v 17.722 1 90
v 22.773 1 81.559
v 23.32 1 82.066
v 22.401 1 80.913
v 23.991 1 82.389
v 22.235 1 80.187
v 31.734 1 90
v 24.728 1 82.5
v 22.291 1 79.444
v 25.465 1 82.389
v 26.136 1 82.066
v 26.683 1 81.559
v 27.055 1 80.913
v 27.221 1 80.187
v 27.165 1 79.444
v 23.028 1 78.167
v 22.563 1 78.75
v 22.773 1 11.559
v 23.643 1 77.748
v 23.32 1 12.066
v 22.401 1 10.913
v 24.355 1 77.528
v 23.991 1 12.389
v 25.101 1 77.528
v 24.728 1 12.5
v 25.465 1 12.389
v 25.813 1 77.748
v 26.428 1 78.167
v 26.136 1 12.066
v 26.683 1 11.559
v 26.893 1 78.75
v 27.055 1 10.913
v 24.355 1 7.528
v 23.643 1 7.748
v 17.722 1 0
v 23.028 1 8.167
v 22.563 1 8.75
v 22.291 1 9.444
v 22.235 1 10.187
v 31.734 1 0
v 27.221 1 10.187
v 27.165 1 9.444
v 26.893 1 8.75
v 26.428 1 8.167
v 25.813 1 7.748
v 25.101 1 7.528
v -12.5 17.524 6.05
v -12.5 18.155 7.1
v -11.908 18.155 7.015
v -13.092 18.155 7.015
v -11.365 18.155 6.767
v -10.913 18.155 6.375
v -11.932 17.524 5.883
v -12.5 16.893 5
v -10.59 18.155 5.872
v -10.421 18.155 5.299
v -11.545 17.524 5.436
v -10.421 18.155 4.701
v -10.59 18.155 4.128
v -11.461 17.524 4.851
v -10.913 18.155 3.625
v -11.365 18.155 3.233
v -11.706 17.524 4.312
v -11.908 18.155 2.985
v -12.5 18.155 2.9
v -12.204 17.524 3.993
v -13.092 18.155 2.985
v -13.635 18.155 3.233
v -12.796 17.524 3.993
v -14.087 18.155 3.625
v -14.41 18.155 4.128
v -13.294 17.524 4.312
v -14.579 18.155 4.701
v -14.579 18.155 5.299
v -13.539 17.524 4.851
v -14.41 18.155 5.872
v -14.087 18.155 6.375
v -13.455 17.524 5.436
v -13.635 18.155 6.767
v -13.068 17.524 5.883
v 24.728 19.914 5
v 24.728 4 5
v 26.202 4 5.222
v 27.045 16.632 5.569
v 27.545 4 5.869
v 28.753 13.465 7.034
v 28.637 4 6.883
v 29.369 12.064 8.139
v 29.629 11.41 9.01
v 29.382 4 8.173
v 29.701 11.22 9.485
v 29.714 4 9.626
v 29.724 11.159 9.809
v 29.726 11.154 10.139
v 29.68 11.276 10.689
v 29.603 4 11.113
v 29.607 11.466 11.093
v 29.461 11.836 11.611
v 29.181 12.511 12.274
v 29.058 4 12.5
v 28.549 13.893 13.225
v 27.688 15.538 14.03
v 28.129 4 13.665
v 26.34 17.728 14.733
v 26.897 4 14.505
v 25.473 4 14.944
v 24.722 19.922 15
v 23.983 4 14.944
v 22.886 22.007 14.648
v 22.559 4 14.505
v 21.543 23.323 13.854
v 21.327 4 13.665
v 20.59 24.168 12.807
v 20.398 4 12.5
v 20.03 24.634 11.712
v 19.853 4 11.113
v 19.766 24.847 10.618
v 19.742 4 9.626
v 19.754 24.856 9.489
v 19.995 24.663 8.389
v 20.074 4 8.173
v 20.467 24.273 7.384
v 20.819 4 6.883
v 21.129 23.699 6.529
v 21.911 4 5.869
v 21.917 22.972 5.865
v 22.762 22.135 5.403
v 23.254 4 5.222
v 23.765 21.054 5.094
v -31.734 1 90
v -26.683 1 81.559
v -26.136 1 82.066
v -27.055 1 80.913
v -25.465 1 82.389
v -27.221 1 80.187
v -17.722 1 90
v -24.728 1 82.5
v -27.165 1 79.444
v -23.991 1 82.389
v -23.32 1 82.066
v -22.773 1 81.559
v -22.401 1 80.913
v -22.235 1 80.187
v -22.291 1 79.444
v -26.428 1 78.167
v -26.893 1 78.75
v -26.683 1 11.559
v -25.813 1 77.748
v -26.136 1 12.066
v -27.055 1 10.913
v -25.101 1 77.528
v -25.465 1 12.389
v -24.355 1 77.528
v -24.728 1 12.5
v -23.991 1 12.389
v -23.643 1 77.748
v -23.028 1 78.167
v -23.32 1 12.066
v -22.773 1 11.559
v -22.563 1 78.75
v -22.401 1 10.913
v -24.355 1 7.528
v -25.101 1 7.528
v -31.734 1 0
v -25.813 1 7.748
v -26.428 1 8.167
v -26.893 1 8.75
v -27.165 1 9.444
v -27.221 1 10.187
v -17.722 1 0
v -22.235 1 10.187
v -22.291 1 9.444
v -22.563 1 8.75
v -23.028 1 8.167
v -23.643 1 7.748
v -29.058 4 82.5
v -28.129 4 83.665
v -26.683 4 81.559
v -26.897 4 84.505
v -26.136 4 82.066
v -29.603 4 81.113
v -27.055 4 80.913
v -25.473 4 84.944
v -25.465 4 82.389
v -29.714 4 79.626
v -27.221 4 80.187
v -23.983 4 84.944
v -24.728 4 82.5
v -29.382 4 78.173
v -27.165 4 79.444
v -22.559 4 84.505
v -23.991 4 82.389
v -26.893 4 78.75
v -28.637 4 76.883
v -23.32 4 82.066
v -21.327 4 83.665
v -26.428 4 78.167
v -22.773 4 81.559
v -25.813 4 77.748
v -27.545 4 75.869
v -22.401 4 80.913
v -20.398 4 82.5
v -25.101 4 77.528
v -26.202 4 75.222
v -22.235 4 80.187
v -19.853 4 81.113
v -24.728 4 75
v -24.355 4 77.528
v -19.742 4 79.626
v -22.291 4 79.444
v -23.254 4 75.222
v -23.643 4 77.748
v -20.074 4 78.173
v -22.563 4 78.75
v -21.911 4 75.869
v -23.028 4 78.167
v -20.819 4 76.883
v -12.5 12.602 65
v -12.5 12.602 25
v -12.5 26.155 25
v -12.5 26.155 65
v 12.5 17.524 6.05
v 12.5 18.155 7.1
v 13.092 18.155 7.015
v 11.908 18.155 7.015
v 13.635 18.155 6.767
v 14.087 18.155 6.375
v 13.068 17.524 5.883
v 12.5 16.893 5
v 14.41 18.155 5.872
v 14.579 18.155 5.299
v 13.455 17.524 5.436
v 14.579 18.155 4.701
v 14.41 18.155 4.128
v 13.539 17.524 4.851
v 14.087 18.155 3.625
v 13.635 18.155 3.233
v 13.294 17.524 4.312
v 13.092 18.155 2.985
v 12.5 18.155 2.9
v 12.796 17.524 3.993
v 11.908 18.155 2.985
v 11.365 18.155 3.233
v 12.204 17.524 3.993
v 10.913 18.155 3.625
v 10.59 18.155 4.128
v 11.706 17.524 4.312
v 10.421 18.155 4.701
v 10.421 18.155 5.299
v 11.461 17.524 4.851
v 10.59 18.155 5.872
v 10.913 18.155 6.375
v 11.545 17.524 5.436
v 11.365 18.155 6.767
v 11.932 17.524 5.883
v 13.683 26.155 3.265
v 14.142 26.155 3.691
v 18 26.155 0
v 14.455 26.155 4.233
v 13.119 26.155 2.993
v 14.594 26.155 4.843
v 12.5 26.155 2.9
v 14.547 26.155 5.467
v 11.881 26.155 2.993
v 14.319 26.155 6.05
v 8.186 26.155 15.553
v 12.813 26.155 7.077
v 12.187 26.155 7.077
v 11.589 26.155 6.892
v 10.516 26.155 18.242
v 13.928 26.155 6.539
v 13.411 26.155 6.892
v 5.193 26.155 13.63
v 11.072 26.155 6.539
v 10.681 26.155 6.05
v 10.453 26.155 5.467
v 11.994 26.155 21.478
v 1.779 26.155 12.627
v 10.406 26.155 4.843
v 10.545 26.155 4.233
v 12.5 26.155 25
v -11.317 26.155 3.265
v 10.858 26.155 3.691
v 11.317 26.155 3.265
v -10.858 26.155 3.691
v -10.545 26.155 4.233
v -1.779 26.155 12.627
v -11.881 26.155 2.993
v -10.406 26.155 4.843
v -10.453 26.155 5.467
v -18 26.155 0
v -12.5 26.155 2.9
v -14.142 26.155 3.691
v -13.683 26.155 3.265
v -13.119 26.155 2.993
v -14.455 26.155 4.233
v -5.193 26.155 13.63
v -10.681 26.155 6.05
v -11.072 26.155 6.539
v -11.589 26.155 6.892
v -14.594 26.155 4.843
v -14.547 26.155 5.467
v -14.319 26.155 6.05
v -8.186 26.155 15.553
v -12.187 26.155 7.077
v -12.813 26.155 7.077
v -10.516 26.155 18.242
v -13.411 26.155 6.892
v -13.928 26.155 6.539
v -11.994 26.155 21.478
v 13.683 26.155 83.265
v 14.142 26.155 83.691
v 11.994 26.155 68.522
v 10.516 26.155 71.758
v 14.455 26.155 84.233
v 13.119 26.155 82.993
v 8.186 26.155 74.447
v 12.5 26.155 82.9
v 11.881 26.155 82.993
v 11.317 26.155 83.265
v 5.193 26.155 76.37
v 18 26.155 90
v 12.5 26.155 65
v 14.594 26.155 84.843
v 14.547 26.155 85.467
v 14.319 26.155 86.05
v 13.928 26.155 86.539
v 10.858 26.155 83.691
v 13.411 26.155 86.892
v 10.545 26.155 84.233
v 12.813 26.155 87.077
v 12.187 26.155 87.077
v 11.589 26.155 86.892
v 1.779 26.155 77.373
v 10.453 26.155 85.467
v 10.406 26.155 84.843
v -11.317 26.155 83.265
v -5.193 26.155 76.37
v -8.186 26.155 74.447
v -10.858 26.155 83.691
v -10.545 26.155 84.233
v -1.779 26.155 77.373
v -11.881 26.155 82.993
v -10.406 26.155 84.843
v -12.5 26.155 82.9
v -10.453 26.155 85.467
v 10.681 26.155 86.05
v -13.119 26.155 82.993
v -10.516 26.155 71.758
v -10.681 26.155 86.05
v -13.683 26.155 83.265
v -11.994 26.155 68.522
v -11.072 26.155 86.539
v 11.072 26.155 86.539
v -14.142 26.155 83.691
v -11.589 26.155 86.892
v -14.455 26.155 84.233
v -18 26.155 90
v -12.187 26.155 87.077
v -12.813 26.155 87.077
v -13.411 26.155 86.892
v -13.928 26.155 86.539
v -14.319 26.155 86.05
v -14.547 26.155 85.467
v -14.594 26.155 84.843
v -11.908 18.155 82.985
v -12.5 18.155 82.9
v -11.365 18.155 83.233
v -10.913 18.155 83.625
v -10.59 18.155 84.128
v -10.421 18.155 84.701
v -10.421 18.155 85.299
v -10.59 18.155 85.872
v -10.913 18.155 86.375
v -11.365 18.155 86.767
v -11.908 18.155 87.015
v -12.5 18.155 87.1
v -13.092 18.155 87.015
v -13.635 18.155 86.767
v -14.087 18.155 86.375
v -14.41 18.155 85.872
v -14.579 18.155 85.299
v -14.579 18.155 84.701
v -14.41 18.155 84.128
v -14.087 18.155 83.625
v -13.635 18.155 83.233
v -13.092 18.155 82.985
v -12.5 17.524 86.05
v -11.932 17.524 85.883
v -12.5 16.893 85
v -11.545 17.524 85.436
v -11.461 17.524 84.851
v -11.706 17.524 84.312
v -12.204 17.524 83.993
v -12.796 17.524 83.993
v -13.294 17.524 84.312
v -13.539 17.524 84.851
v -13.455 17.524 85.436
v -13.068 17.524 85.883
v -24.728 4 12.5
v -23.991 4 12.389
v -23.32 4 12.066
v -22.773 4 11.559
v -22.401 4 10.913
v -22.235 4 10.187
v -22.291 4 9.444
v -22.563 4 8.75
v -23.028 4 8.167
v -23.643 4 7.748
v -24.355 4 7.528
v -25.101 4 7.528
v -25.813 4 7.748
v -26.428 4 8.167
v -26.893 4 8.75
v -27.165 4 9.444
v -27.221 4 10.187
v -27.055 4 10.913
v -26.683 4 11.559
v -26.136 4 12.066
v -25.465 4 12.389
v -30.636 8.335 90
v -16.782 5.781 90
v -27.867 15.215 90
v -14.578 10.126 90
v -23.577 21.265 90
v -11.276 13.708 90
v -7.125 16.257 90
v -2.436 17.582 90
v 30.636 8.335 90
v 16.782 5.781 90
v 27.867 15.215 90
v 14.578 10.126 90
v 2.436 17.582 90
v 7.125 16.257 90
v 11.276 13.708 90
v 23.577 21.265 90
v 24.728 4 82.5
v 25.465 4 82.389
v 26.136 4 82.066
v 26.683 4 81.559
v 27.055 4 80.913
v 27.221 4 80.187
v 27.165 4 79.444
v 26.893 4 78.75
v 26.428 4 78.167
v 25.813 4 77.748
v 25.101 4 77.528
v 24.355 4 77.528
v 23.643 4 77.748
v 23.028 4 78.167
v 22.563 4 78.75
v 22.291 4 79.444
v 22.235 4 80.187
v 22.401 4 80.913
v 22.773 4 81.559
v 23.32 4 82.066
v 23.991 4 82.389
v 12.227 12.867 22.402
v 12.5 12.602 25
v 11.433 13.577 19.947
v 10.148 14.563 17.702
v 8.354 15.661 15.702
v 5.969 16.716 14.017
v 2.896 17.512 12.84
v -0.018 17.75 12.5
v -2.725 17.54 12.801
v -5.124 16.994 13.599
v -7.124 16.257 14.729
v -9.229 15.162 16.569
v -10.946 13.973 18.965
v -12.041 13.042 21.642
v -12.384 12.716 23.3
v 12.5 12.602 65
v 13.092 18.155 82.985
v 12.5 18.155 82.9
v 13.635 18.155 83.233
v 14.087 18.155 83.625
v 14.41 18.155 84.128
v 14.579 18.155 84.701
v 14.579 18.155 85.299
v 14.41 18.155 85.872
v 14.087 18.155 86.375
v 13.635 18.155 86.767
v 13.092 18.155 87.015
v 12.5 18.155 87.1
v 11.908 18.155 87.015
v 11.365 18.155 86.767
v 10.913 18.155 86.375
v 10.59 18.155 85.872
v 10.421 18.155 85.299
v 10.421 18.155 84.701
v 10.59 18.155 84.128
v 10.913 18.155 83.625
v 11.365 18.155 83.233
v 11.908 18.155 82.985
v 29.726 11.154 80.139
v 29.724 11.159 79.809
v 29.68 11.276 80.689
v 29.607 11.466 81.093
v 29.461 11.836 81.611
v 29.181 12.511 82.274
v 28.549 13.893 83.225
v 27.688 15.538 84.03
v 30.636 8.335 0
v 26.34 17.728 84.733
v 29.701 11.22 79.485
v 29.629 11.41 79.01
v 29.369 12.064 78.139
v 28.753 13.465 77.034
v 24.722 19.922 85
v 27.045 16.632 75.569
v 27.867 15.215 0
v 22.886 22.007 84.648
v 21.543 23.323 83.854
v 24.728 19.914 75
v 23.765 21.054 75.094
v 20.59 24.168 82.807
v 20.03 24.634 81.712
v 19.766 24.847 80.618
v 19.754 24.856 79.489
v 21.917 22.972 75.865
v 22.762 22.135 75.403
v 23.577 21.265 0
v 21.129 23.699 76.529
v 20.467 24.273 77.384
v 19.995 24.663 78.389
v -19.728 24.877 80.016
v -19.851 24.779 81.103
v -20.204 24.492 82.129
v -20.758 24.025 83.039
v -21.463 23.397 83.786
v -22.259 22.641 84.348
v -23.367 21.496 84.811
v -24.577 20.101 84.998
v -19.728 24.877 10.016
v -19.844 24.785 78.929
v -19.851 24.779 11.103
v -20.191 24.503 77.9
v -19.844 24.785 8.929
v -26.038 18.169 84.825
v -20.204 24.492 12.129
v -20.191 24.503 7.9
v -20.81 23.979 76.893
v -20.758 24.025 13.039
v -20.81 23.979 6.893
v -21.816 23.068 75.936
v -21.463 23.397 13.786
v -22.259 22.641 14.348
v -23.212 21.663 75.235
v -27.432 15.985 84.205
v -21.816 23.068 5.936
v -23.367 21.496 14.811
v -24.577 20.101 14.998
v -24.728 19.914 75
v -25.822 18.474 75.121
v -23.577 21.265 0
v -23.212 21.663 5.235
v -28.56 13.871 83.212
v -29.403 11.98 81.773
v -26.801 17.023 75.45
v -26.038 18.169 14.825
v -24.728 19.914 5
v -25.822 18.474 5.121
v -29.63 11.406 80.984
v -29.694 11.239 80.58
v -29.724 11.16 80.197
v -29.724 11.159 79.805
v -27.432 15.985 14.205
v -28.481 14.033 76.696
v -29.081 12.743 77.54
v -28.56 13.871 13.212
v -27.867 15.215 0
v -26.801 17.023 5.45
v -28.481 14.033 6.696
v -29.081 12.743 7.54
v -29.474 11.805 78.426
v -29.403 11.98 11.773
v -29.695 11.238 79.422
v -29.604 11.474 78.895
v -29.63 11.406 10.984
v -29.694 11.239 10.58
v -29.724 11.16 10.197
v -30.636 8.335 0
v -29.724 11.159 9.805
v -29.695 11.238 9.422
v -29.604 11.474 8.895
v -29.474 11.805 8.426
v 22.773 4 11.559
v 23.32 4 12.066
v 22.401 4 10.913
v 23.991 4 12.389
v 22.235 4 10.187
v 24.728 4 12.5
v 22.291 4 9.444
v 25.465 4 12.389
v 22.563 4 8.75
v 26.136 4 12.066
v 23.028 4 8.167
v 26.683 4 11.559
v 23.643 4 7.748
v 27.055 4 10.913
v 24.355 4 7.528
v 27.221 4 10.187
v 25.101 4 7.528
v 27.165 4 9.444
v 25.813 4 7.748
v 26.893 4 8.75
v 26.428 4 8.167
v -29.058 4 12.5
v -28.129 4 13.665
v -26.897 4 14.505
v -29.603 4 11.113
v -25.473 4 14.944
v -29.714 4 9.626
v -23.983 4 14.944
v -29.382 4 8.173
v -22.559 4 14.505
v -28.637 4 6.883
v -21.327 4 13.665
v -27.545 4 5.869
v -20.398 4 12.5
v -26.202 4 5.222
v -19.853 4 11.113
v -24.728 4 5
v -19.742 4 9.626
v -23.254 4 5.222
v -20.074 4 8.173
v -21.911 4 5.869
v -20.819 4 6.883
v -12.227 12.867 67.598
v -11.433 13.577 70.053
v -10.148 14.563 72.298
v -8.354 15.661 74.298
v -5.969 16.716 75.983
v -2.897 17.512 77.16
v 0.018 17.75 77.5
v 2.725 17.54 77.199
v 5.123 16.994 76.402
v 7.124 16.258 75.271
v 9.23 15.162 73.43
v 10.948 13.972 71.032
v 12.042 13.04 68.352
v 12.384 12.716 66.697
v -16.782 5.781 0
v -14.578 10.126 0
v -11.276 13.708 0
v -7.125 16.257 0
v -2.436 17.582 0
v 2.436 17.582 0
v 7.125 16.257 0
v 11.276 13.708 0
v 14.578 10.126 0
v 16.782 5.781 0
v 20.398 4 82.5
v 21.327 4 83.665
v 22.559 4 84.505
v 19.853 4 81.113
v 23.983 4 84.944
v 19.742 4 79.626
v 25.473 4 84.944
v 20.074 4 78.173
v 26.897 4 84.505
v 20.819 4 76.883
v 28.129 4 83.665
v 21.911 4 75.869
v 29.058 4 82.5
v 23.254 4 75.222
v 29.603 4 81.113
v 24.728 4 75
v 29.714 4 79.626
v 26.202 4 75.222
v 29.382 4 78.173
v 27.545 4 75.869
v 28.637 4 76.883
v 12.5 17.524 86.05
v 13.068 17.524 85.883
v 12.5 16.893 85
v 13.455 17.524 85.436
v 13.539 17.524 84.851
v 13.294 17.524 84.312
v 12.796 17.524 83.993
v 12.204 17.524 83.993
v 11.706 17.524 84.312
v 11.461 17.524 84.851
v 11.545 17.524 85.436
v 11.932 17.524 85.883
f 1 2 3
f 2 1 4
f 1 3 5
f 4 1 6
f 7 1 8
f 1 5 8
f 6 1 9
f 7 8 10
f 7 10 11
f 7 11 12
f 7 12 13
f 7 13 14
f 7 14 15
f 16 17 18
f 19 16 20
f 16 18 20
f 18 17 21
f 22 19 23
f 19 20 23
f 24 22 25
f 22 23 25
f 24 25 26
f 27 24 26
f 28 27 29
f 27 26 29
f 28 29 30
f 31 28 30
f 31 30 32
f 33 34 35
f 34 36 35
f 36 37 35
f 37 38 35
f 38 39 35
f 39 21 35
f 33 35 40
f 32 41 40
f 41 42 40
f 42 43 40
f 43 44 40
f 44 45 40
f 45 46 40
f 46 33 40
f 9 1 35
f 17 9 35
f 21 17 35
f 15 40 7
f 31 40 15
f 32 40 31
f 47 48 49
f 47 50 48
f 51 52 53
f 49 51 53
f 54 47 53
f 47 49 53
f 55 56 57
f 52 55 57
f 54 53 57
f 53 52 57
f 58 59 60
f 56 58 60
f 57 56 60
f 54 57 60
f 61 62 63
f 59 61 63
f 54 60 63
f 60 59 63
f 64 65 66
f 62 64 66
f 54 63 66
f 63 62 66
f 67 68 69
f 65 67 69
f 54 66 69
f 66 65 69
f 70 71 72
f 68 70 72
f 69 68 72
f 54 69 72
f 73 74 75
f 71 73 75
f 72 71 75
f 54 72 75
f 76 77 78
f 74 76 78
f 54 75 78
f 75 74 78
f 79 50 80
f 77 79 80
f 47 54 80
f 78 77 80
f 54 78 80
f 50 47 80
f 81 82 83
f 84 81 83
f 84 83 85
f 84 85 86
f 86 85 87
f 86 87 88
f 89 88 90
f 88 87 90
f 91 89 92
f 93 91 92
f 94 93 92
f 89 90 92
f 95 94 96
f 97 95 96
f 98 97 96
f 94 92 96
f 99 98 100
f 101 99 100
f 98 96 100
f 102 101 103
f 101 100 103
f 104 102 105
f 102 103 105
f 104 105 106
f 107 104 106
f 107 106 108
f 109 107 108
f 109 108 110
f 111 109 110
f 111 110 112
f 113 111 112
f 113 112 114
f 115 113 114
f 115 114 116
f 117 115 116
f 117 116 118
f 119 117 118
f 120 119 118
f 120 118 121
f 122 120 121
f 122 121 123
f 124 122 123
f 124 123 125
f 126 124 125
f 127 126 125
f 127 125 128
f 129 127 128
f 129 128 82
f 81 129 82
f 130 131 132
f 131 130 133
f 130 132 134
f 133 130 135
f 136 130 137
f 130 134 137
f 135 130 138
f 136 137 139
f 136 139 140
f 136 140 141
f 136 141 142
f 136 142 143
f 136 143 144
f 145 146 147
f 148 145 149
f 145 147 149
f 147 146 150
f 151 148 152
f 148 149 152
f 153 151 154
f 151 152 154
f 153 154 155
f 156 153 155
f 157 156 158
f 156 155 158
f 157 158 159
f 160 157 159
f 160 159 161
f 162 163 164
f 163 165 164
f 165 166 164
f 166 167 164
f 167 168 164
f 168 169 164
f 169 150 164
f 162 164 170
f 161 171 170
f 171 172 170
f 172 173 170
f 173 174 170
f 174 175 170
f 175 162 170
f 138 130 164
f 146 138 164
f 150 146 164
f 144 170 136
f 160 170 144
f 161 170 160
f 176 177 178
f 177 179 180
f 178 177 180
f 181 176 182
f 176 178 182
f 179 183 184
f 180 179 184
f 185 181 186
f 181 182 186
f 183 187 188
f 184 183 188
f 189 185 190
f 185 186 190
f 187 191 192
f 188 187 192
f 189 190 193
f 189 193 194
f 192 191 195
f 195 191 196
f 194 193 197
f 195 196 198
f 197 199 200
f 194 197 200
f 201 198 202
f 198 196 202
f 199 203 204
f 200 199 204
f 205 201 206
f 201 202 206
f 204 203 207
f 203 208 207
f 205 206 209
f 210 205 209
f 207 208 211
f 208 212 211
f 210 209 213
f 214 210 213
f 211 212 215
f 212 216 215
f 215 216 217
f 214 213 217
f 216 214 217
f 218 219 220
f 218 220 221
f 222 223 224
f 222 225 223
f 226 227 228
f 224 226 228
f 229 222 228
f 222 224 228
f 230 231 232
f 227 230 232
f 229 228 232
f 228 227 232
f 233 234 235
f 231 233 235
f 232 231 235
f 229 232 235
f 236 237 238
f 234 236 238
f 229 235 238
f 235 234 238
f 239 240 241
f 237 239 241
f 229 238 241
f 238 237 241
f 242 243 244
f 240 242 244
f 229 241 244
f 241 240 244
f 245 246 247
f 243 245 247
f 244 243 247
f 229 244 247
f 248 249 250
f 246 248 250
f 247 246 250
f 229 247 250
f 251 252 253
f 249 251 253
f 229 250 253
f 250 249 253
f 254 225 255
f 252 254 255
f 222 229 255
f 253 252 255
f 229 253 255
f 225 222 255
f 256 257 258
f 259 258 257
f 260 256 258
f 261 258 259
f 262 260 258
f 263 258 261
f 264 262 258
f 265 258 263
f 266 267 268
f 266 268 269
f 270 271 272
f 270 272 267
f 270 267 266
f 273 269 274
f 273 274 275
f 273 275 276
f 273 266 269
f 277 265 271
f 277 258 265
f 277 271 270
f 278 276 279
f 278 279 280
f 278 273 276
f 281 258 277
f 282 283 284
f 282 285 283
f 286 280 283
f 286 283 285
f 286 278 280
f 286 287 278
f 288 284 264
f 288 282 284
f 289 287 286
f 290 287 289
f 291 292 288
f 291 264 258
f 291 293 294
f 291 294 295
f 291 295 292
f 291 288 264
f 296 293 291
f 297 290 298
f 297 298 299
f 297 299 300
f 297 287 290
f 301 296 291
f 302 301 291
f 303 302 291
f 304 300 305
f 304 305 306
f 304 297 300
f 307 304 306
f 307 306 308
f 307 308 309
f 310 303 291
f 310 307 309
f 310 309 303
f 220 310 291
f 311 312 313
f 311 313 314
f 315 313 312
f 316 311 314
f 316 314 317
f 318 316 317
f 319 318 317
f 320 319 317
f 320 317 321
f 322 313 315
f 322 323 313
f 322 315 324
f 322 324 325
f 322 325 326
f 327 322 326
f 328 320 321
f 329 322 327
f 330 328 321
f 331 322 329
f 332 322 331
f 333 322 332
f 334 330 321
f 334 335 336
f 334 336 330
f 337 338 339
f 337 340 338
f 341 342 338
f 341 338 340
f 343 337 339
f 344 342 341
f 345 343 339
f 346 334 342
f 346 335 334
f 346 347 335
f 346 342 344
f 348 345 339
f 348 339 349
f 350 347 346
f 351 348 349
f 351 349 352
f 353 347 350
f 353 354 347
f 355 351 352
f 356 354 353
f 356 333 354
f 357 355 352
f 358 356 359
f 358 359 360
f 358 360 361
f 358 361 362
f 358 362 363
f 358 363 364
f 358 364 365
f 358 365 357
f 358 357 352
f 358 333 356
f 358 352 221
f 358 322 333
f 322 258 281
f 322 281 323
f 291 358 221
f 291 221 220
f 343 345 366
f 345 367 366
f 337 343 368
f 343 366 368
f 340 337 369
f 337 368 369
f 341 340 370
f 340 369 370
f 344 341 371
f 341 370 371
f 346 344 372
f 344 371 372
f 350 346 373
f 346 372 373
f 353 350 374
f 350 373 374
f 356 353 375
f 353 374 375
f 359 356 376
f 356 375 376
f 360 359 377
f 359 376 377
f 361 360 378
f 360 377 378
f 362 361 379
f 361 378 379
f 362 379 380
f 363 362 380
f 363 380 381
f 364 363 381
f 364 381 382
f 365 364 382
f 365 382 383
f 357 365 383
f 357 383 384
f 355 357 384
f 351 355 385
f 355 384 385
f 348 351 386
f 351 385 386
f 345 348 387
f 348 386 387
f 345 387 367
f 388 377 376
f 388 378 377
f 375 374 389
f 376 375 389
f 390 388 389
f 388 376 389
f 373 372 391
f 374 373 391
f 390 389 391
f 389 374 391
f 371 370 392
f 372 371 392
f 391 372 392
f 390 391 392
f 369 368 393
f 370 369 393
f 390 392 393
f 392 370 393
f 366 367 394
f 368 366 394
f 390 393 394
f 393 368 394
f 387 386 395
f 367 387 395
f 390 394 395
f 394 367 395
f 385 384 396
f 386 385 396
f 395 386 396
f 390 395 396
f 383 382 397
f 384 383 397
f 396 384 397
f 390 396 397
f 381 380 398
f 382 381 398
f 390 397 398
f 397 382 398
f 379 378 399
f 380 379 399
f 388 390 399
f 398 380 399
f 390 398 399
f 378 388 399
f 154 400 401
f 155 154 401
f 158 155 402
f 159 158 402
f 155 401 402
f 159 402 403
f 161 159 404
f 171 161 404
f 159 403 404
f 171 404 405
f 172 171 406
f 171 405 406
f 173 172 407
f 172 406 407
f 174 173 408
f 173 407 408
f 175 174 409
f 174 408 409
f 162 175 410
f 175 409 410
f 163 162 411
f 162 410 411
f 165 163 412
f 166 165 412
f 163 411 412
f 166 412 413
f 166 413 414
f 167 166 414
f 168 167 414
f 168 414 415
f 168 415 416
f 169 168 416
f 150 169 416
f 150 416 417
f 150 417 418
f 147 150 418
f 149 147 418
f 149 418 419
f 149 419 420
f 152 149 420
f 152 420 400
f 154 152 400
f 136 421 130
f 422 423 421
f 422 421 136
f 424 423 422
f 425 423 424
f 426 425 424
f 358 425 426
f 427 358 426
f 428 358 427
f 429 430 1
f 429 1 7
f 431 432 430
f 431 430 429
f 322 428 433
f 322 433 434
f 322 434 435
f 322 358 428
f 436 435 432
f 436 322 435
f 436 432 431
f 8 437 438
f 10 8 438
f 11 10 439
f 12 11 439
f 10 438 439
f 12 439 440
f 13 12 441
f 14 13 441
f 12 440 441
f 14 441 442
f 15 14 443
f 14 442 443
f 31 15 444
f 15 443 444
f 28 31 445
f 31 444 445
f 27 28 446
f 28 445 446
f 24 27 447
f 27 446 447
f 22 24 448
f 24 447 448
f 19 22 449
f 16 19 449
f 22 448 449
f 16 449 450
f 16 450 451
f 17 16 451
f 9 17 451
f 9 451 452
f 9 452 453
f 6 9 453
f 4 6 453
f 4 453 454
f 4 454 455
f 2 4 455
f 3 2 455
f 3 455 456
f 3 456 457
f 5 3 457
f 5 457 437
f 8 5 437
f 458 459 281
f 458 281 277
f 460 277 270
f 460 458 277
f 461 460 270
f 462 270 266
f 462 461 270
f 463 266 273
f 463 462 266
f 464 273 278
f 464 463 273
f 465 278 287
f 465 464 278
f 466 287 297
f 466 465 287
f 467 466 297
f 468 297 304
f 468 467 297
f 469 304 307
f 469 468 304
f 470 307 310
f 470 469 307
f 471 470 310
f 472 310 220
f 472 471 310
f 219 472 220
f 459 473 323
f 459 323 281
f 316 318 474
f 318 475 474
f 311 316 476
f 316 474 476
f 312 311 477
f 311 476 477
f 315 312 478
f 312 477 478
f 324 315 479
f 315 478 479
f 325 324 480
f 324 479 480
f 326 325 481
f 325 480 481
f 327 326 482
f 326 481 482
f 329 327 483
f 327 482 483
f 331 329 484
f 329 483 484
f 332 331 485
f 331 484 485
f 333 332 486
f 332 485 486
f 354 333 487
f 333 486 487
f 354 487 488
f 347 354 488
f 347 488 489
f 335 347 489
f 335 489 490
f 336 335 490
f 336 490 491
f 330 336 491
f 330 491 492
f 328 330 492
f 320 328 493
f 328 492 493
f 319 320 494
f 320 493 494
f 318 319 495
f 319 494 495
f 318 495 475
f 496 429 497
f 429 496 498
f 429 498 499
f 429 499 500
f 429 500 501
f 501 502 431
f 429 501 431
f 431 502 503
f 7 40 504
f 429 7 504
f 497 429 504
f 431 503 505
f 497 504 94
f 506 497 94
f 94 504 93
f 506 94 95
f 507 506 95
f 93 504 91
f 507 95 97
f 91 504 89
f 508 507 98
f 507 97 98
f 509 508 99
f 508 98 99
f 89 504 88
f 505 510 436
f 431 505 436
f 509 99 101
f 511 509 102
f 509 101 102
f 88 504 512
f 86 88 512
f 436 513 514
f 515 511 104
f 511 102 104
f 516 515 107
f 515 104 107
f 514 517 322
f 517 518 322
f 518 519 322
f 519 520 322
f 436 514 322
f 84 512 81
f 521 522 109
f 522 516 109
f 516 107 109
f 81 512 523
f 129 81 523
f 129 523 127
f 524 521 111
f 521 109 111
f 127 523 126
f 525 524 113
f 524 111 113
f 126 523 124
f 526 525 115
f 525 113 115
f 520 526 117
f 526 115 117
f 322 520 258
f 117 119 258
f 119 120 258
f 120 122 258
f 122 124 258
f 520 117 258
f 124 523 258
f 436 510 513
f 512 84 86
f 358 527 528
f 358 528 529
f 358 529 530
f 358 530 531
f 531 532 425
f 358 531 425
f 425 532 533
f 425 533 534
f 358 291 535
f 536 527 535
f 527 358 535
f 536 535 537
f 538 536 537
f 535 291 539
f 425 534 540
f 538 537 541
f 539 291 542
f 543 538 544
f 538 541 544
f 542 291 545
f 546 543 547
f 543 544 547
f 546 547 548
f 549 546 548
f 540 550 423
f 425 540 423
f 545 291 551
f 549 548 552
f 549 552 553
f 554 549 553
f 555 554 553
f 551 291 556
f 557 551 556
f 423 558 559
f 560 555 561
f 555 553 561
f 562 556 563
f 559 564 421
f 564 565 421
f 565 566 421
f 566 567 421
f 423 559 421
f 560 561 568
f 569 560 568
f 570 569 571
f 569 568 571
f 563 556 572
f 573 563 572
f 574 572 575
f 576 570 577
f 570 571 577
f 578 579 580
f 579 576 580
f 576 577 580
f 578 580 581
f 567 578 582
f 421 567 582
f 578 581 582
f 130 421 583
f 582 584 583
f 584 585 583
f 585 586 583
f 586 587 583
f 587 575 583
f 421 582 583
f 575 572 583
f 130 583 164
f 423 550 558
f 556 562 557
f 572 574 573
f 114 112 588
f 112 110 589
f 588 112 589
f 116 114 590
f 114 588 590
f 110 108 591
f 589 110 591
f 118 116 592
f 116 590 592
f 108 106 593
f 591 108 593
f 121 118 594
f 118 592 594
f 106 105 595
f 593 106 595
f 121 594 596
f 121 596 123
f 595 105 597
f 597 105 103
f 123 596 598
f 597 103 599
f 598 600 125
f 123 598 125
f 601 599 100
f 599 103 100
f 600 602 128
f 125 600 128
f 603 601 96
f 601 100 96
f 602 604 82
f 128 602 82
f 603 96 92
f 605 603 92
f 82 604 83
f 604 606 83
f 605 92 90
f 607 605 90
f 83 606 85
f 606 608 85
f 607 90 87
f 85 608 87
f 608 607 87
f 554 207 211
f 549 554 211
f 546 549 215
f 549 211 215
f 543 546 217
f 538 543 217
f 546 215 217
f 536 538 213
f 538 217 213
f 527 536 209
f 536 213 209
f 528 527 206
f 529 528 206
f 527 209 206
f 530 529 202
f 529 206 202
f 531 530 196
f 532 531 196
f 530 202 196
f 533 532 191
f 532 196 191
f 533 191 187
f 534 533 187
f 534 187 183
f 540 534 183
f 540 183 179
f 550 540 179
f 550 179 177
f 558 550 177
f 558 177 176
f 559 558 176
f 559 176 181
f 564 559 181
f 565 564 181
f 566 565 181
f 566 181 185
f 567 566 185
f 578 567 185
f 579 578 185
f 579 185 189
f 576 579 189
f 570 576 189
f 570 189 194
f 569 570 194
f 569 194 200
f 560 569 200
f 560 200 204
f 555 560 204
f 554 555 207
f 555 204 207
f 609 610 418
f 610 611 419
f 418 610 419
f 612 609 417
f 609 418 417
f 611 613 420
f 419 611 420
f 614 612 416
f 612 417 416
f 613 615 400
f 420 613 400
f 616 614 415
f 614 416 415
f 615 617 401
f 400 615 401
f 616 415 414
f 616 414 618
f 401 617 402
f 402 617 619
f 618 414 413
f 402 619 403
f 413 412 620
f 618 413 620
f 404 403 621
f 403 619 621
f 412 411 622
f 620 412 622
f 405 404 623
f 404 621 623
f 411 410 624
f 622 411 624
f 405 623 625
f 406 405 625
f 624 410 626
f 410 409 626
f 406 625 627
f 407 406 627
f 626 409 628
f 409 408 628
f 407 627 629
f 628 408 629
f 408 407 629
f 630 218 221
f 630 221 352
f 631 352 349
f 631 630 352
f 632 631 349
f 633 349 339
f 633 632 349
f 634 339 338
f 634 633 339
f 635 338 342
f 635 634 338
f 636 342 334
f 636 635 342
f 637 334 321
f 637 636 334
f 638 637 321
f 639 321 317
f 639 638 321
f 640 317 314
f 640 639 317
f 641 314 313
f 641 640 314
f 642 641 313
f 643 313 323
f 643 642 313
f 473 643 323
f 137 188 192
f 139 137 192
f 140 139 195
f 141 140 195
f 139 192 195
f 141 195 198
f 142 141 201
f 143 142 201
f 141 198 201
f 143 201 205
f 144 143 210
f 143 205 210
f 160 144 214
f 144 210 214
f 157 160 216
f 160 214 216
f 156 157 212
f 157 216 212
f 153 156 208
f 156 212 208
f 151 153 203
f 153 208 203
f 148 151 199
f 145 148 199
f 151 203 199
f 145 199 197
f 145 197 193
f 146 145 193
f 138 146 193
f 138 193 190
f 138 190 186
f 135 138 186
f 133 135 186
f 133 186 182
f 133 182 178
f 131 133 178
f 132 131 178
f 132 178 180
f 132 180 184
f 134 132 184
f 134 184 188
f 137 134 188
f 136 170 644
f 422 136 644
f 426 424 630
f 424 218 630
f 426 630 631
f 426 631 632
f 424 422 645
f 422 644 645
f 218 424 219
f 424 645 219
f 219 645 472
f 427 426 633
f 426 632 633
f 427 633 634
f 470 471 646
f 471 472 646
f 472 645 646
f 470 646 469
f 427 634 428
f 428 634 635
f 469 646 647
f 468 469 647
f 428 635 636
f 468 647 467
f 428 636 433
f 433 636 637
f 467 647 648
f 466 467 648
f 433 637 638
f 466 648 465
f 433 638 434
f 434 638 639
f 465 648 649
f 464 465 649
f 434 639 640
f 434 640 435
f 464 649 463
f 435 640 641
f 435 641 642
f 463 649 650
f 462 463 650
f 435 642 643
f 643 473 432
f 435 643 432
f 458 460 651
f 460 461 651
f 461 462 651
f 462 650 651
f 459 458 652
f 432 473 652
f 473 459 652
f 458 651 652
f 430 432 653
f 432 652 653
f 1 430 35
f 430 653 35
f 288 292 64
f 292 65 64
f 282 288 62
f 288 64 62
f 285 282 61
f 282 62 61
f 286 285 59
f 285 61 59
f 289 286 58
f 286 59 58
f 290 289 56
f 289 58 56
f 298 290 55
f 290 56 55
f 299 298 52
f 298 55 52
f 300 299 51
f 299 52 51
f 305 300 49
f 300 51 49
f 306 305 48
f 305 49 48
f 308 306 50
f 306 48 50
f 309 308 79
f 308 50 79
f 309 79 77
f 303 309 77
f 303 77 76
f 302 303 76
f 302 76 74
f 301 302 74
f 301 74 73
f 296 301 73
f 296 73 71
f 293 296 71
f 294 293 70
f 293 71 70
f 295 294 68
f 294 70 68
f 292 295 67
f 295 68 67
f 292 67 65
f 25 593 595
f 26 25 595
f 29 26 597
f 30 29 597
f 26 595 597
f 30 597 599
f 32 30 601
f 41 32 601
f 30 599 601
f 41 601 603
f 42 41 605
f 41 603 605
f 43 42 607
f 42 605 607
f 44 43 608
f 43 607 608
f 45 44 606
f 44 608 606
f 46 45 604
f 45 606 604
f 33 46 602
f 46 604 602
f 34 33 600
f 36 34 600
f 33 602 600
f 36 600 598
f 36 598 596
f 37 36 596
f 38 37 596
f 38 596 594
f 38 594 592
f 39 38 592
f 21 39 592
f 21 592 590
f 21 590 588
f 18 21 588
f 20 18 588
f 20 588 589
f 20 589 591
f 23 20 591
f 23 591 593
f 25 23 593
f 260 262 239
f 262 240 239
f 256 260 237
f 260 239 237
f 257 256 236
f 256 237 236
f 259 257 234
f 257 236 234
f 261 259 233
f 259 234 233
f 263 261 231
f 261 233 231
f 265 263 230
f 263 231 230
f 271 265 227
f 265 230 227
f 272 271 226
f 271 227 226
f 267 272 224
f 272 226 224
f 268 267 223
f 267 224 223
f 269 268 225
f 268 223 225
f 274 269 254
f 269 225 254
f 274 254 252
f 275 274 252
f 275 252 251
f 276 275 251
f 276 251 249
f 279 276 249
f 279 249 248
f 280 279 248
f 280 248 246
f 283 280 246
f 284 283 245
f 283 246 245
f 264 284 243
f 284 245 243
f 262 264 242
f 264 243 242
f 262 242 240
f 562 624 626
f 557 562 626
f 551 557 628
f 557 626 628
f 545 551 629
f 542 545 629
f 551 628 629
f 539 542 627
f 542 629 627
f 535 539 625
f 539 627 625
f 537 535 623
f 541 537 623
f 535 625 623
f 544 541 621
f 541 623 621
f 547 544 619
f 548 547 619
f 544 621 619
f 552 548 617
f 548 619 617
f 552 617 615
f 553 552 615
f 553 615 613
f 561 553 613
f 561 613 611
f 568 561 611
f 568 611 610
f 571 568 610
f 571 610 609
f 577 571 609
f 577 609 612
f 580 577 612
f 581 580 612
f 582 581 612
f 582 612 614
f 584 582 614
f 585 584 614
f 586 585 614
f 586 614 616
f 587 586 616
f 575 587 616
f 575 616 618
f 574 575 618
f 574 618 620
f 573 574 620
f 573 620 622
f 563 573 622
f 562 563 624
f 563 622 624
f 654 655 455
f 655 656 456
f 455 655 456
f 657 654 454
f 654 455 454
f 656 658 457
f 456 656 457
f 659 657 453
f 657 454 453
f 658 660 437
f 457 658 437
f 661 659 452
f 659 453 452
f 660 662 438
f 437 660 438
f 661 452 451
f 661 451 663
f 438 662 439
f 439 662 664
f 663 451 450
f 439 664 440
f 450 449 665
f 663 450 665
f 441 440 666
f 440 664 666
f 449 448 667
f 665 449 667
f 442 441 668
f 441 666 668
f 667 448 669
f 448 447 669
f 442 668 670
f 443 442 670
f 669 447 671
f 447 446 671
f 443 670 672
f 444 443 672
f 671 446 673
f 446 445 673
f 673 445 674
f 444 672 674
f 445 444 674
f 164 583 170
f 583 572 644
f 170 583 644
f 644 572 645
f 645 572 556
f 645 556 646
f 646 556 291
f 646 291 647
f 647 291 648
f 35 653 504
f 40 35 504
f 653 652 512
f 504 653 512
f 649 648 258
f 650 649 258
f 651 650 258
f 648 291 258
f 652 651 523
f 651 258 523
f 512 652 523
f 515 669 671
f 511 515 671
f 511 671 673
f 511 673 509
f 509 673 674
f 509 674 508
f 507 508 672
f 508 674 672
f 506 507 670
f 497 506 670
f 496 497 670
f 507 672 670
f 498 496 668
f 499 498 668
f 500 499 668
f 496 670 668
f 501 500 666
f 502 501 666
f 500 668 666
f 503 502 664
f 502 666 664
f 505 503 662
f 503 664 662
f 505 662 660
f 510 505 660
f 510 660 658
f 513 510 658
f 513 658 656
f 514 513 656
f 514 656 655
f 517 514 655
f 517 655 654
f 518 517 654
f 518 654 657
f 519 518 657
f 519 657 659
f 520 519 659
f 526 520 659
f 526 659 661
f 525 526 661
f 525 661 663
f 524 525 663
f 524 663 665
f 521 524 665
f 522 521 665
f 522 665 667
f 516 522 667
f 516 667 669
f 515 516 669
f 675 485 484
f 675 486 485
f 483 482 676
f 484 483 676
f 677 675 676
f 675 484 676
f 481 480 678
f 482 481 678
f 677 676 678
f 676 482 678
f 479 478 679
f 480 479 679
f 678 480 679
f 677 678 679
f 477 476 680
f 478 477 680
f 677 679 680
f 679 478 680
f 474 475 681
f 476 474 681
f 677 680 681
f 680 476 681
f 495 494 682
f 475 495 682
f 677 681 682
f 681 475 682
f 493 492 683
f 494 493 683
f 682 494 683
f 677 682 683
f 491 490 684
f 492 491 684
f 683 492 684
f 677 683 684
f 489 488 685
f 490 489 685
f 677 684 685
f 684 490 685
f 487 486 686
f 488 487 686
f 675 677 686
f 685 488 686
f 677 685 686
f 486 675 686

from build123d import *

# Parameters (mm, degrees)
BOSS_EXTRUDE1_DEPTH             = 90
F_5_0MM_CLEARANCE_DOWEL_HOLE1_D = 5
CUT_EXTRUDE1_REACH              = 101.384
CUT_EXTRUDE1_END_RADIUS         = 31.75
SKETCH4_R                       = 5
CUT_EXTRUDE3_DEPTH              = 101.5739779
CUT_EXTRUDE4_REACH              = 100.691
TAP_DRILL_FOR_M5X0_8_TAP1_D     = 4.2
TAP_DRILL_FOR_M5X0_8_TAP1_DEPTH = 8
TAP_DRILL_FOR_M5X0_8_TAP1_TIP   = 1.2618073


with BuildPart() as part:
    # Sketch1 → Boss-Extrude1 (new body)
    with BuildSketch(Plane.XY):
        with BuildLine():
            Line((-31.734248061, 1), (-17.721808598, 1))
            ThreePointArc((-17.721808598, 1), (0, 17.75), (17.721808598, 1))
            Line((17.721808598, 1), (31.734248061, 1))
            ThreePointArc((31.734248061, 1), (0, 31.75), (-31.734248061, 1))
        make_face()
    extrude(amount=BOSS_EXTRUDE1_DEPTH)

    # Ø5.0mm Clearance Dowel Hole1 (through all)
    with Locations(Plane(origin=(-24.72802833, 1, 80), x_dir=(0, 0, -1), z_dir=(0, -1, 0))):
        with Locations((0, 0), (70, 0), (0, 49.45605666), (70, 49.45605666)):
            Hole(F_5_0MM_CLEARANCE_DOWEL_HOLE1_D / 2)

    # Cut-Extrude1: up to this cylinder (the profile starts inside it)
    cut_extrude1_end = Plane(origin=(0, 0, 45), z_dir=(0, 0, -1)) * Cylinder(CUT_EXTRUDE1_END_RADIUS, 337.268, mode=Mode.PRIVATE)
    # Sketch4 → Cut-Extrude1 (cut, up to the surface)
    with BuildSketch(Plane(origin=(0, 4, 0), x_dir=(-1, 0, 0), z_dir=(0, -1, 0)), mode=Mode.PRIVATE) as cut_extrude1_sk1:
        with Locations(Location((24.72802833, -80, 0), (0, 0, 90))):
            Circle(SKETCH4_R)
    cut_extrude1_tool1 = extrude(cut_extrude1_sk1.sketch, amount=-CUT_EXTRUDE1_REACH, mode=Mode.PRIVATE) & cut_extrude1_end
    add(cut_extrude1_tool1.solids().sort_by_distance((-24.728028, 4, 80))[0], mode=Mode.SUBTRACT)
    # Sketch4 → Cut-Extrude1 (cut, up to the surface)
    with BuildSketch(Plane(origin=(0, 4, 0), x_dir=(-1, 0, 0), z_dir=(0, -1, 0)), mode=Mode.PRIVATE) as cut_extrude1_sk2:
        with Locations(Location((24.72802833, -10, 0), (0, 0, 90))):
            Circle(SKETCH4_R)
    cut_extrude1_tool2 = extrude(cut_extrude1_sk2.sketch, amount=-CUT_EXTRUDE1_REACH, mode=Mode.PRIVATE) & cut_extrude1_end
    add(cut_extrude1_tool2.solids().sort_by_distance((-24.728028, 4, 10))[0], mode=Mode.SUBTRACT)
    # Sketch4 → Cut-Extrude1 (cut, up to the surface)
    with BuildSketch(Plane(origin=(0, 4, 0), x_dir=(-1, 0, 0), z_dir=(0, -1, 0)), mode=Mode.PRIVATE) as cut_extrude1_sk3:
        with Locations(Location((-24.72802833, -10, 0), (0, 0, 90))):
            Circle(SKETCH4_R)
    cut_extrude1_tool3 = extrude(cut_extrude1_sk3.sketch, amount=-CUT_EXTRUDE1_REACH, mode=Mode.PRIVATE) & cut_extrude1_end
    add(cut_extrude1_tool3.solids().sort_by_distance((24.728028, 4, 10))[0], mode=Mode.SUBTRACT)
    # Sketch4 → Cut-Extrude1 (cut, up to the surface)
    with BuildSketch(Plane(origin=(0, 4, 0), x_dir=(-1, 0, 0), z_dir=(0, -1, 0)), mode=Mode.PRIVATE) as cut_extrude1_sk4:
        with Locations(Location((-24.72802833, -80, 0), (0, 0, 90))):
            Circle(SKETCH4_R)
    cut_extrude1_tool4 = extrude(cut_extrude1_sk4.sketch, amount=-CUT_EXTRUDE1_REACH, mode=Mode.PRIVATE) & cut_extrude1_end
    add(cut_extrude1_tool4.solids().sort_by_distance((24.728028, 4, 80))[0], mode=Mode.SUBTRACT)

    # Sketch8 → Cut-Extrude3 (cut, through all)
    with BuildSketch(Plane.XY.offset(90)):
        with BuildLine():
            Line((18, 26.154588508), (-18, 26.154588508))
            ThreePointArc((-18, 26.154588508), (0, 31.75), (18, 26.154588508))
        make_face()
    extrude(amount=-CUT_EXTRUDE3_DEPTH, mode=Mode.SUBTRACT)

    # Sketch9 → Cut-Extrude4 (cut, up to next)
    with BuildSketch(Plane.XZ.offset(-1), mode=Mode.PRIVATE) as cut_extrude4_sk1:
        with BuildLine():
            Line((-12.5, 25), (-12.5, 65))
            ThreePointArc((-12.5, 65), (0, 77.5), (12.5, 65))
            Line((12.5, 65), (12.5, 25))
            ThreePointArc((12.5, 25), (0, 12.5), (-12.5, 25))
        make_face()
    cut_extrude4_tool1 = extrude(cut_extrude4_sk1.sketch, amount=-CUT_EXTRUDE4_REACH, mode=Mode.PRIVATE) & part.part
    add(cut_extrude4_tool1.solids().sort_by_distance((0, 1, 45))[0], mode=Mode.SUBTRACT)

    # Tap Drill for M5x0.8 Tap1
    with Locations(Plane(origin=(-12.5, 26.154588508, 5), x_dir=(0, 0, 1), z_dir=(0, 1, 0))):
        with Locations((0, 0), (0, 25), (80, 25), (80, 0)):
            Hole(TAP_DRILL_FOR_M5X0_8_TAP1_D / 2, depth=TAP_DRILL_FOR_M5X0_8_TAP1_DEPTH)
            with Locations((0, 0, -(TAP_DRILL_FOR_M5X0_8_TAP1_DEPTH + TAP_DRILL_FOR_M5X0_8_TAP1_TIP / 2))):  # 118° drill point
                Cone(0, TAP_DRILL_FOR_M5X0_8_TAP1_D / 2, TAP_DRILL_FOR_M5X0_8_TAP1_TIP, mode=Mode.SUBTRACT)


solid = part.part
